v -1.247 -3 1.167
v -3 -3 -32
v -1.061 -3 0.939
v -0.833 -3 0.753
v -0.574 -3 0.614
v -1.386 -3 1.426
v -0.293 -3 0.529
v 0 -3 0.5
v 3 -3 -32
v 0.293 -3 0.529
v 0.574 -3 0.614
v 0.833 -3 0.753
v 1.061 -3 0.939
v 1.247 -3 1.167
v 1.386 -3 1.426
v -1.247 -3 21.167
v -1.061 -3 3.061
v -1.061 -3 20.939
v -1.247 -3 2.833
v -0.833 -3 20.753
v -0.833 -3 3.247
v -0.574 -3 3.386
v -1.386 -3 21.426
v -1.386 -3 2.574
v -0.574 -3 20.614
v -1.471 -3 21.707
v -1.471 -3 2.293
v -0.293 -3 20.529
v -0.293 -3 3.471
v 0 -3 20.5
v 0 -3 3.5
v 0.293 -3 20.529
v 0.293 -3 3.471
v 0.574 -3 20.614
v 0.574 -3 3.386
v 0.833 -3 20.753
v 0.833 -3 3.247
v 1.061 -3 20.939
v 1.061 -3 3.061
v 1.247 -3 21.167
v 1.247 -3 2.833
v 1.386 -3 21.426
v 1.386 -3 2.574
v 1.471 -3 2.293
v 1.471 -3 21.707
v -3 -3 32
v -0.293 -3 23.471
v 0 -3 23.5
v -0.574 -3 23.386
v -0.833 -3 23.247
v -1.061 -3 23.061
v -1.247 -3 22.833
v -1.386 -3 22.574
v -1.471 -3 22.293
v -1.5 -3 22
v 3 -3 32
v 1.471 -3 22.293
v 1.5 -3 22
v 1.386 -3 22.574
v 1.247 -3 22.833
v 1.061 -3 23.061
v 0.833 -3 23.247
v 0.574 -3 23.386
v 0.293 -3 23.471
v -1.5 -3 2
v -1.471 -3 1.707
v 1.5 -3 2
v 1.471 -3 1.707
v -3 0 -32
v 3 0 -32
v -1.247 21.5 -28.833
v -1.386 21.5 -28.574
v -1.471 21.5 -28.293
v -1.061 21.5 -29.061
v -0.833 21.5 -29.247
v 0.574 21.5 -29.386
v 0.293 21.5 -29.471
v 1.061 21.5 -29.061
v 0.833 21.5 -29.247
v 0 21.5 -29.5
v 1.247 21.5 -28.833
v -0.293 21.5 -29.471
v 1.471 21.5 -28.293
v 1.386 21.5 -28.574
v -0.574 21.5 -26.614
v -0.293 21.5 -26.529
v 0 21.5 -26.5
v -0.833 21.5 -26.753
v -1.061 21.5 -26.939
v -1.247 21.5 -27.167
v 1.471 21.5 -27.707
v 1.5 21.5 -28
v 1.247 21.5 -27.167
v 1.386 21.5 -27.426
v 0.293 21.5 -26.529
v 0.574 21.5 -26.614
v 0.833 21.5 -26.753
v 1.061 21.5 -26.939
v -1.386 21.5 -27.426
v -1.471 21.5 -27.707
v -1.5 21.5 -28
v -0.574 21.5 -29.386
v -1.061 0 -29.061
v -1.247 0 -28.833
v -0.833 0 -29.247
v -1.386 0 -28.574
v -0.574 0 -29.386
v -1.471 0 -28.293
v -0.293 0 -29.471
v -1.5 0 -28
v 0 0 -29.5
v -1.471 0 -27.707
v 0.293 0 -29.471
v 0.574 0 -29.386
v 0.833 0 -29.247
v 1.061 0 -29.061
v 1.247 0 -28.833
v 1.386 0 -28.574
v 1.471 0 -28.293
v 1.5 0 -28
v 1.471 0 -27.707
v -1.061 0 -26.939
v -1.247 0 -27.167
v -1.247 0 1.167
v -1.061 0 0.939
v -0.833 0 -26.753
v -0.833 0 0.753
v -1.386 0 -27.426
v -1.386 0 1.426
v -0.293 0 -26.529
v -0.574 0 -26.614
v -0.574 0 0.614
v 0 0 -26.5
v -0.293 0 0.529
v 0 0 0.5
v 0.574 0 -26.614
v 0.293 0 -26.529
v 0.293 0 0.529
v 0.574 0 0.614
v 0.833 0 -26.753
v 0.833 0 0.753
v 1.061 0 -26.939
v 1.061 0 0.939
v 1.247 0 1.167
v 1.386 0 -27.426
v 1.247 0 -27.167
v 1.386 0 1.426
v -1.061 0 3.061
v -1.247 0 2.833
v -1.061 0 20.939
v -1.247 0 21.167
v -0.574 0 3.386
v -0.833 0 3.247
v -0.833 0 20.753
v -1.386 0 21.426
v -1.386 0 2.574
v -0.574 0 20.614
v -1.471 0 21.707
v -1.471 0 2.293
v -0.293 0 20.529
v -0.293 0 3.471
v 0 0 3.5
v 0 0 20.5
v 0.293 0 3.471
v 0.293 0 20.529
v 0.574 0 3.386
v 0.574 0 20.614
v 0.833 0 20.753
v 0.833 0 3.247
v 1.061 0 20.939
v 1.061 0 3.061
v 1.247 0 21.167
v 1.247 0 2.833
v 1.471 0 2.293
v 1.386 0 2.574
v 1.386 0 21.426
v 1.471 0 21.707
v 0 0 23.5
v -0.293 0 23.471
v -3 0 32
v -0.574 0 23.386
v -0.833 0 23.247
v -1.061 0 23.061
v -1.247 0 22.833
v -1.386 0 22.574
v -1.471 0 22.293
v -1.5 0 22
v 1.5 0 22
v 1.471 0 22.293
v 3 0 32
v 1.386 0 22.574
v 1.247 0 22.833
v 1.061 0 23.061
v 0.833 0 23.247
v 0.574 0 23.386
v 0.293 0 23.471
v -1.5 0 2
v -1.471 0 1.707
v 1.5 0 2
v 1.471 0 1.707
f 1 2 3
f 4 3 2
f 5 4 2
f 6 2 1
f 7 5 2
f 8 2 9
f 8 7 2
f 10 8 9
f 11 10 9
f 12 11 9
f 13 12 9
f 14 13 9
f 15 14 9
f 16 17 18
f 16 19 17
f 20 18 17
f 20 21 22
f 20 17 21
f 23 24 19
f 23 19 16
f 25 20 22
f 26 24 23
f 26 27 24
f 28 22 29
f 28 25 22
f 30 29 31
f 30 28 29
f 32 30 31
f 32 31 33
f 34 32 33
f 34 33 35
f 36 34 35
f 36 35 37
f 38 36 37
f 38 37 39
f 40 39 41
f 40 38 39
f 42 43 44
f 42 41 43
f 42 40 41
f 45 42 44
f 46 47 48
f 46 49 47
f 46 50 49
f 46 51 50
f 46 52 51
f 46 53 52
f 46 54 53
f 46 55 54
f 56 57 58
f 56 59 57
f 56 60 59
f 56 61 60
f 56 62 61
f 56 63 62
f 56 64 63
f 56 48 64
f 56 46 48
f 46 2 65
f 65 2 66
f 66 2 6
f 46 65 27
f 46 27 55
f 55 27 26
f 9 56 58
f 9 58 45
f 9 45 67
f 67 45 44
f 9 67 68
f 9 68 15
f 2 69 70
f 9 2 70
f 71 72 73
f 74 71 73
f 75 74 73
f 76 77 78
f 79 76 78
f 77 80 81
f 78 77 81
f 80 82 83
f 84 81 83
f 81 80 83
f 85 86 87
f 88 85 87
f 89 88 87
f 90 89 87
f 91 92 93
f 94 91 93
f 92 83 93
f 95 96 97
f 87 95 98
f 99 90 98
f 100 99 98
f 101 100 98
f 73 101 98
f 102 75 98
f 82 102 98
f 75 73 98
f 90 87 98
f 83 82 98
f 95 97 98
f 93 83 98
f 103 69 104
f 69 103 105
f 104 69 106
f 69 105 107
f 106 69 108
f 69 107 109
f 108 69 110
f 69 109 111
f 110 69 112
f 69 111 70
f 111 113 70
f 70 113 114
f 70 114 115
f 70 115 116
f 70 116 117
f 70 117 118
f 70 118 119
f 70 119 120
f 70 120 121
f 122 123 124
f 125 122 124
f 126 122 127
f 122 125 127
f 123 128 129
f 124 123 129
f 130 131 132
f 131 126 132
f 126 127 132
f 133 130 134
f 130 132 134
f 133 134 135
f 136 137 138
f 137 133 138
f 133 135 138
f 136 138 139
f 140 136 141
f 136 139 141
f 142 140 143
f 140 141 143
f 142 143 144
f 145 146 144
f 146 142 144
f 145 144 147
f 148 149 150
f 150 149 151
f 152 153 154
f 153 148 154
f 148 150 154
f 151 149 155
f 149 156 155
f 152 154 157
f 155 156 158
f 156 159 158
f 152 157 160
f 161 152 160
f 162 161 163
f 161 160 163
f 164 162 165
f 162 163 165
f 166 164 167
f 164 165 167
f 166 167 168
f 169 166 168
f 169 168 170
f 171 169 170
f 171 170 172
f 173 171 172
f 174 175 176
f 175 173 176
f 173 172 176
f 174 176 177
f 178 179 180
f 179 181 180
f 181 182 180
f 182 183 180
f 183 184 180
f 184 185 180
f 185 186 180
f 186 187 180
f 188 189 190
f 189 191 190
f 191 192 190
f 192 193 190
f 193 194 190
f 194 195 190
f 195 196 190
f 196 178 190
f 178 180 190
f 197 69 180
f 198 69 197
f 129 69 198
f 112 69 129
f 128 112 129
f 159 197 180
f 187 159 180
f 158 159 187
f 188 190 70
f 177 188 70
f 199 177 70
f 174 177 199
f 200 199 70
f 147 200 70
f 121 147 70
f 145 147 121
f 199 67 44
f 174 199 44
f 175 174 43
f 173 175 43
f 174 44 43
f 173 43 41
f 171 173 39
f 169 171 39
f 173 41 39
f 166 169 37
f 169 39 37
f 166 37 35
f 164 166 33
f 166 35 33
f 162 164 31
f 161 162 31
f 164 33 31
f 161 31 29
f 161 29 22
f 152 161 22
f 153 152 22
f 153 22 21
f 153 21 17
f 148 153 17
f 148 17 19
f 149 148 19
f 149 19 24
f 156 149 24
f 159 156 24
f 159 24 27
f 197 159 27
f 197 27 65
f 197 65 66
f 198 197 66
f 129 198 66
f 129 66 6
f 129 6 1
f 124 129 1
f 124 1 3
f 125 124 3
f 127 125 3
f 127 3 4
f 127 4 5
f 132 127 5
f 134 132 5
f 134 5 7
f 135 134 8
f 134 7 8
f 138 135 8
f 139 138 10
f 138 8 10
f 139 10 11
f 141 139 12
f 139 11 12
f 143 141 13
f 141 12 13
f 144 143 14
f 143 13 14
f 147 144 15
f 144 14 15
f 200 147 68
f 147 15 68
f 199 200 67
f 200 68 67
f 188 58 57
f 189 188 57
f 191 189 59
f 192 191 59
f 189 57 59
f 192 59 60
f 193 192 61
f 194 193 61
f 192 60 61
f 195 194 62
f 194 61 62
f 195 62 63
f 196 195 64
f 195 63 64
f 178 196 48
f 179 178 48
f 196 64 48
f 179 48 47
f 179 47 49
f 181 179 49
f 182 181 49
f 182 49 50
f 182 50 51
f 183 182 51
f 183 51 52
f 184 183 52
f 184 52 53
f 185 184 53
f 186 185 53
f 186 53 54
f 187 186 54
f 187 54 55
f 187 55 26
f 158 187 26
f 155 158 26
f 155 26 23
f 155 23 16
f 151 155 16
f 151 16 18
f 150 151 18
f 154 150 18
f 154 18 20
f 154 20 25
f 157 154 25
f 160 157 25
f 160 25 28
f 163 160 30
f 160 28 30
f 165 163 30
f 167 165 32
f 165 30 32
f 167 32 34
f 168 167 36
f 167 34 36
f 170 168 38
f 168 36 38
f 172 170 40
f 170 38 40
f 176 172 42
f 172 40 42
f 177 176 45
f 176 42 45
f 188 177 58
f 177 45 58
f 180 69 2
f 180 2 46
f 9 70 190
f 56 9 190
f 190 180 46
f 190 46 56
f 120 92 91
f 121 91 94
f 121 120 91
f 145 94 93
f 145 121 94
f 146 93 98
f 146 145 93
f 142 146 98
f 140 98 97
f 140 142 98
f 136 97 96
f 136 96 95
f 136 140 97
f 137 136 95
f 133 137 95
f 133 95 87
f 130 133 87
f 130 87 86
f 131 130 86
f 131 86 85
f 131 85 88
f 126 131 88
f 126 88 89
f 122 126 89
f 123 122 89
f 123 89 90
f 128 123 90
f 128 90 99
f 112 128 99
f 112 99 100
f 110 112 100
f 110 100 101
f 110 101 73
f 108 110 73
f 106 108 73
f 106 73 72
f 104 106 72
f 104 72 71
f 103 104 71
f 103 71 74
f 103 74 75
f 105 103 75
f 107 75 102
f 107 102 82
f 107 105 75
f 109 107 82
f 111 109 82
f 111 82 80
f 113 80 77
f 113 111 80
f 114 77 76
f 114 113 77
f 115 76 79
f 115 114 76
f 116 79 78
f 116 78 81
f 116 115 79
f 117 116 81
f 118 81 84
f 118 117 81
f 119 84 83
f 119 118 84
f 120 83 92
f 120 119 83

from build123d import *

# Parameters (mm, degrees)
F0_W     = 6
F0_H     = 64
F1_DEPTH = 3
F2_R     = 1.5
F3_DEPTH = 5
F4_R     = 1.5
F5_DEPTH = 24.5


with BuildPart() as f1:
    # F0 (on Front) → F1 (new body)
    with BuildSketch(Plane.XZ):
        Rectangle(F0_W, F0_H)
    extrude(amount=F1_DEPTH)

    # F2 (on face) → F3 (cut)
    with BuildSketch(Plane.XZ.offset(3)):
        with Locations((0, 2)):
            Circle(F2_R)
        with Locations((0, 22)):
            Circle(F2_R)
    extrude(amount=-F3_DEPTH, mode=Mode.SUBTRACT)

    # F4 (on face) → F5 (join)
    with BuildSketch(Plane.XZ.offset(3)):
        with Locations((0, -28)):
            Circle(F4_R)
    extrude(amount=-F5_DEPTH)


solid = f1.part
